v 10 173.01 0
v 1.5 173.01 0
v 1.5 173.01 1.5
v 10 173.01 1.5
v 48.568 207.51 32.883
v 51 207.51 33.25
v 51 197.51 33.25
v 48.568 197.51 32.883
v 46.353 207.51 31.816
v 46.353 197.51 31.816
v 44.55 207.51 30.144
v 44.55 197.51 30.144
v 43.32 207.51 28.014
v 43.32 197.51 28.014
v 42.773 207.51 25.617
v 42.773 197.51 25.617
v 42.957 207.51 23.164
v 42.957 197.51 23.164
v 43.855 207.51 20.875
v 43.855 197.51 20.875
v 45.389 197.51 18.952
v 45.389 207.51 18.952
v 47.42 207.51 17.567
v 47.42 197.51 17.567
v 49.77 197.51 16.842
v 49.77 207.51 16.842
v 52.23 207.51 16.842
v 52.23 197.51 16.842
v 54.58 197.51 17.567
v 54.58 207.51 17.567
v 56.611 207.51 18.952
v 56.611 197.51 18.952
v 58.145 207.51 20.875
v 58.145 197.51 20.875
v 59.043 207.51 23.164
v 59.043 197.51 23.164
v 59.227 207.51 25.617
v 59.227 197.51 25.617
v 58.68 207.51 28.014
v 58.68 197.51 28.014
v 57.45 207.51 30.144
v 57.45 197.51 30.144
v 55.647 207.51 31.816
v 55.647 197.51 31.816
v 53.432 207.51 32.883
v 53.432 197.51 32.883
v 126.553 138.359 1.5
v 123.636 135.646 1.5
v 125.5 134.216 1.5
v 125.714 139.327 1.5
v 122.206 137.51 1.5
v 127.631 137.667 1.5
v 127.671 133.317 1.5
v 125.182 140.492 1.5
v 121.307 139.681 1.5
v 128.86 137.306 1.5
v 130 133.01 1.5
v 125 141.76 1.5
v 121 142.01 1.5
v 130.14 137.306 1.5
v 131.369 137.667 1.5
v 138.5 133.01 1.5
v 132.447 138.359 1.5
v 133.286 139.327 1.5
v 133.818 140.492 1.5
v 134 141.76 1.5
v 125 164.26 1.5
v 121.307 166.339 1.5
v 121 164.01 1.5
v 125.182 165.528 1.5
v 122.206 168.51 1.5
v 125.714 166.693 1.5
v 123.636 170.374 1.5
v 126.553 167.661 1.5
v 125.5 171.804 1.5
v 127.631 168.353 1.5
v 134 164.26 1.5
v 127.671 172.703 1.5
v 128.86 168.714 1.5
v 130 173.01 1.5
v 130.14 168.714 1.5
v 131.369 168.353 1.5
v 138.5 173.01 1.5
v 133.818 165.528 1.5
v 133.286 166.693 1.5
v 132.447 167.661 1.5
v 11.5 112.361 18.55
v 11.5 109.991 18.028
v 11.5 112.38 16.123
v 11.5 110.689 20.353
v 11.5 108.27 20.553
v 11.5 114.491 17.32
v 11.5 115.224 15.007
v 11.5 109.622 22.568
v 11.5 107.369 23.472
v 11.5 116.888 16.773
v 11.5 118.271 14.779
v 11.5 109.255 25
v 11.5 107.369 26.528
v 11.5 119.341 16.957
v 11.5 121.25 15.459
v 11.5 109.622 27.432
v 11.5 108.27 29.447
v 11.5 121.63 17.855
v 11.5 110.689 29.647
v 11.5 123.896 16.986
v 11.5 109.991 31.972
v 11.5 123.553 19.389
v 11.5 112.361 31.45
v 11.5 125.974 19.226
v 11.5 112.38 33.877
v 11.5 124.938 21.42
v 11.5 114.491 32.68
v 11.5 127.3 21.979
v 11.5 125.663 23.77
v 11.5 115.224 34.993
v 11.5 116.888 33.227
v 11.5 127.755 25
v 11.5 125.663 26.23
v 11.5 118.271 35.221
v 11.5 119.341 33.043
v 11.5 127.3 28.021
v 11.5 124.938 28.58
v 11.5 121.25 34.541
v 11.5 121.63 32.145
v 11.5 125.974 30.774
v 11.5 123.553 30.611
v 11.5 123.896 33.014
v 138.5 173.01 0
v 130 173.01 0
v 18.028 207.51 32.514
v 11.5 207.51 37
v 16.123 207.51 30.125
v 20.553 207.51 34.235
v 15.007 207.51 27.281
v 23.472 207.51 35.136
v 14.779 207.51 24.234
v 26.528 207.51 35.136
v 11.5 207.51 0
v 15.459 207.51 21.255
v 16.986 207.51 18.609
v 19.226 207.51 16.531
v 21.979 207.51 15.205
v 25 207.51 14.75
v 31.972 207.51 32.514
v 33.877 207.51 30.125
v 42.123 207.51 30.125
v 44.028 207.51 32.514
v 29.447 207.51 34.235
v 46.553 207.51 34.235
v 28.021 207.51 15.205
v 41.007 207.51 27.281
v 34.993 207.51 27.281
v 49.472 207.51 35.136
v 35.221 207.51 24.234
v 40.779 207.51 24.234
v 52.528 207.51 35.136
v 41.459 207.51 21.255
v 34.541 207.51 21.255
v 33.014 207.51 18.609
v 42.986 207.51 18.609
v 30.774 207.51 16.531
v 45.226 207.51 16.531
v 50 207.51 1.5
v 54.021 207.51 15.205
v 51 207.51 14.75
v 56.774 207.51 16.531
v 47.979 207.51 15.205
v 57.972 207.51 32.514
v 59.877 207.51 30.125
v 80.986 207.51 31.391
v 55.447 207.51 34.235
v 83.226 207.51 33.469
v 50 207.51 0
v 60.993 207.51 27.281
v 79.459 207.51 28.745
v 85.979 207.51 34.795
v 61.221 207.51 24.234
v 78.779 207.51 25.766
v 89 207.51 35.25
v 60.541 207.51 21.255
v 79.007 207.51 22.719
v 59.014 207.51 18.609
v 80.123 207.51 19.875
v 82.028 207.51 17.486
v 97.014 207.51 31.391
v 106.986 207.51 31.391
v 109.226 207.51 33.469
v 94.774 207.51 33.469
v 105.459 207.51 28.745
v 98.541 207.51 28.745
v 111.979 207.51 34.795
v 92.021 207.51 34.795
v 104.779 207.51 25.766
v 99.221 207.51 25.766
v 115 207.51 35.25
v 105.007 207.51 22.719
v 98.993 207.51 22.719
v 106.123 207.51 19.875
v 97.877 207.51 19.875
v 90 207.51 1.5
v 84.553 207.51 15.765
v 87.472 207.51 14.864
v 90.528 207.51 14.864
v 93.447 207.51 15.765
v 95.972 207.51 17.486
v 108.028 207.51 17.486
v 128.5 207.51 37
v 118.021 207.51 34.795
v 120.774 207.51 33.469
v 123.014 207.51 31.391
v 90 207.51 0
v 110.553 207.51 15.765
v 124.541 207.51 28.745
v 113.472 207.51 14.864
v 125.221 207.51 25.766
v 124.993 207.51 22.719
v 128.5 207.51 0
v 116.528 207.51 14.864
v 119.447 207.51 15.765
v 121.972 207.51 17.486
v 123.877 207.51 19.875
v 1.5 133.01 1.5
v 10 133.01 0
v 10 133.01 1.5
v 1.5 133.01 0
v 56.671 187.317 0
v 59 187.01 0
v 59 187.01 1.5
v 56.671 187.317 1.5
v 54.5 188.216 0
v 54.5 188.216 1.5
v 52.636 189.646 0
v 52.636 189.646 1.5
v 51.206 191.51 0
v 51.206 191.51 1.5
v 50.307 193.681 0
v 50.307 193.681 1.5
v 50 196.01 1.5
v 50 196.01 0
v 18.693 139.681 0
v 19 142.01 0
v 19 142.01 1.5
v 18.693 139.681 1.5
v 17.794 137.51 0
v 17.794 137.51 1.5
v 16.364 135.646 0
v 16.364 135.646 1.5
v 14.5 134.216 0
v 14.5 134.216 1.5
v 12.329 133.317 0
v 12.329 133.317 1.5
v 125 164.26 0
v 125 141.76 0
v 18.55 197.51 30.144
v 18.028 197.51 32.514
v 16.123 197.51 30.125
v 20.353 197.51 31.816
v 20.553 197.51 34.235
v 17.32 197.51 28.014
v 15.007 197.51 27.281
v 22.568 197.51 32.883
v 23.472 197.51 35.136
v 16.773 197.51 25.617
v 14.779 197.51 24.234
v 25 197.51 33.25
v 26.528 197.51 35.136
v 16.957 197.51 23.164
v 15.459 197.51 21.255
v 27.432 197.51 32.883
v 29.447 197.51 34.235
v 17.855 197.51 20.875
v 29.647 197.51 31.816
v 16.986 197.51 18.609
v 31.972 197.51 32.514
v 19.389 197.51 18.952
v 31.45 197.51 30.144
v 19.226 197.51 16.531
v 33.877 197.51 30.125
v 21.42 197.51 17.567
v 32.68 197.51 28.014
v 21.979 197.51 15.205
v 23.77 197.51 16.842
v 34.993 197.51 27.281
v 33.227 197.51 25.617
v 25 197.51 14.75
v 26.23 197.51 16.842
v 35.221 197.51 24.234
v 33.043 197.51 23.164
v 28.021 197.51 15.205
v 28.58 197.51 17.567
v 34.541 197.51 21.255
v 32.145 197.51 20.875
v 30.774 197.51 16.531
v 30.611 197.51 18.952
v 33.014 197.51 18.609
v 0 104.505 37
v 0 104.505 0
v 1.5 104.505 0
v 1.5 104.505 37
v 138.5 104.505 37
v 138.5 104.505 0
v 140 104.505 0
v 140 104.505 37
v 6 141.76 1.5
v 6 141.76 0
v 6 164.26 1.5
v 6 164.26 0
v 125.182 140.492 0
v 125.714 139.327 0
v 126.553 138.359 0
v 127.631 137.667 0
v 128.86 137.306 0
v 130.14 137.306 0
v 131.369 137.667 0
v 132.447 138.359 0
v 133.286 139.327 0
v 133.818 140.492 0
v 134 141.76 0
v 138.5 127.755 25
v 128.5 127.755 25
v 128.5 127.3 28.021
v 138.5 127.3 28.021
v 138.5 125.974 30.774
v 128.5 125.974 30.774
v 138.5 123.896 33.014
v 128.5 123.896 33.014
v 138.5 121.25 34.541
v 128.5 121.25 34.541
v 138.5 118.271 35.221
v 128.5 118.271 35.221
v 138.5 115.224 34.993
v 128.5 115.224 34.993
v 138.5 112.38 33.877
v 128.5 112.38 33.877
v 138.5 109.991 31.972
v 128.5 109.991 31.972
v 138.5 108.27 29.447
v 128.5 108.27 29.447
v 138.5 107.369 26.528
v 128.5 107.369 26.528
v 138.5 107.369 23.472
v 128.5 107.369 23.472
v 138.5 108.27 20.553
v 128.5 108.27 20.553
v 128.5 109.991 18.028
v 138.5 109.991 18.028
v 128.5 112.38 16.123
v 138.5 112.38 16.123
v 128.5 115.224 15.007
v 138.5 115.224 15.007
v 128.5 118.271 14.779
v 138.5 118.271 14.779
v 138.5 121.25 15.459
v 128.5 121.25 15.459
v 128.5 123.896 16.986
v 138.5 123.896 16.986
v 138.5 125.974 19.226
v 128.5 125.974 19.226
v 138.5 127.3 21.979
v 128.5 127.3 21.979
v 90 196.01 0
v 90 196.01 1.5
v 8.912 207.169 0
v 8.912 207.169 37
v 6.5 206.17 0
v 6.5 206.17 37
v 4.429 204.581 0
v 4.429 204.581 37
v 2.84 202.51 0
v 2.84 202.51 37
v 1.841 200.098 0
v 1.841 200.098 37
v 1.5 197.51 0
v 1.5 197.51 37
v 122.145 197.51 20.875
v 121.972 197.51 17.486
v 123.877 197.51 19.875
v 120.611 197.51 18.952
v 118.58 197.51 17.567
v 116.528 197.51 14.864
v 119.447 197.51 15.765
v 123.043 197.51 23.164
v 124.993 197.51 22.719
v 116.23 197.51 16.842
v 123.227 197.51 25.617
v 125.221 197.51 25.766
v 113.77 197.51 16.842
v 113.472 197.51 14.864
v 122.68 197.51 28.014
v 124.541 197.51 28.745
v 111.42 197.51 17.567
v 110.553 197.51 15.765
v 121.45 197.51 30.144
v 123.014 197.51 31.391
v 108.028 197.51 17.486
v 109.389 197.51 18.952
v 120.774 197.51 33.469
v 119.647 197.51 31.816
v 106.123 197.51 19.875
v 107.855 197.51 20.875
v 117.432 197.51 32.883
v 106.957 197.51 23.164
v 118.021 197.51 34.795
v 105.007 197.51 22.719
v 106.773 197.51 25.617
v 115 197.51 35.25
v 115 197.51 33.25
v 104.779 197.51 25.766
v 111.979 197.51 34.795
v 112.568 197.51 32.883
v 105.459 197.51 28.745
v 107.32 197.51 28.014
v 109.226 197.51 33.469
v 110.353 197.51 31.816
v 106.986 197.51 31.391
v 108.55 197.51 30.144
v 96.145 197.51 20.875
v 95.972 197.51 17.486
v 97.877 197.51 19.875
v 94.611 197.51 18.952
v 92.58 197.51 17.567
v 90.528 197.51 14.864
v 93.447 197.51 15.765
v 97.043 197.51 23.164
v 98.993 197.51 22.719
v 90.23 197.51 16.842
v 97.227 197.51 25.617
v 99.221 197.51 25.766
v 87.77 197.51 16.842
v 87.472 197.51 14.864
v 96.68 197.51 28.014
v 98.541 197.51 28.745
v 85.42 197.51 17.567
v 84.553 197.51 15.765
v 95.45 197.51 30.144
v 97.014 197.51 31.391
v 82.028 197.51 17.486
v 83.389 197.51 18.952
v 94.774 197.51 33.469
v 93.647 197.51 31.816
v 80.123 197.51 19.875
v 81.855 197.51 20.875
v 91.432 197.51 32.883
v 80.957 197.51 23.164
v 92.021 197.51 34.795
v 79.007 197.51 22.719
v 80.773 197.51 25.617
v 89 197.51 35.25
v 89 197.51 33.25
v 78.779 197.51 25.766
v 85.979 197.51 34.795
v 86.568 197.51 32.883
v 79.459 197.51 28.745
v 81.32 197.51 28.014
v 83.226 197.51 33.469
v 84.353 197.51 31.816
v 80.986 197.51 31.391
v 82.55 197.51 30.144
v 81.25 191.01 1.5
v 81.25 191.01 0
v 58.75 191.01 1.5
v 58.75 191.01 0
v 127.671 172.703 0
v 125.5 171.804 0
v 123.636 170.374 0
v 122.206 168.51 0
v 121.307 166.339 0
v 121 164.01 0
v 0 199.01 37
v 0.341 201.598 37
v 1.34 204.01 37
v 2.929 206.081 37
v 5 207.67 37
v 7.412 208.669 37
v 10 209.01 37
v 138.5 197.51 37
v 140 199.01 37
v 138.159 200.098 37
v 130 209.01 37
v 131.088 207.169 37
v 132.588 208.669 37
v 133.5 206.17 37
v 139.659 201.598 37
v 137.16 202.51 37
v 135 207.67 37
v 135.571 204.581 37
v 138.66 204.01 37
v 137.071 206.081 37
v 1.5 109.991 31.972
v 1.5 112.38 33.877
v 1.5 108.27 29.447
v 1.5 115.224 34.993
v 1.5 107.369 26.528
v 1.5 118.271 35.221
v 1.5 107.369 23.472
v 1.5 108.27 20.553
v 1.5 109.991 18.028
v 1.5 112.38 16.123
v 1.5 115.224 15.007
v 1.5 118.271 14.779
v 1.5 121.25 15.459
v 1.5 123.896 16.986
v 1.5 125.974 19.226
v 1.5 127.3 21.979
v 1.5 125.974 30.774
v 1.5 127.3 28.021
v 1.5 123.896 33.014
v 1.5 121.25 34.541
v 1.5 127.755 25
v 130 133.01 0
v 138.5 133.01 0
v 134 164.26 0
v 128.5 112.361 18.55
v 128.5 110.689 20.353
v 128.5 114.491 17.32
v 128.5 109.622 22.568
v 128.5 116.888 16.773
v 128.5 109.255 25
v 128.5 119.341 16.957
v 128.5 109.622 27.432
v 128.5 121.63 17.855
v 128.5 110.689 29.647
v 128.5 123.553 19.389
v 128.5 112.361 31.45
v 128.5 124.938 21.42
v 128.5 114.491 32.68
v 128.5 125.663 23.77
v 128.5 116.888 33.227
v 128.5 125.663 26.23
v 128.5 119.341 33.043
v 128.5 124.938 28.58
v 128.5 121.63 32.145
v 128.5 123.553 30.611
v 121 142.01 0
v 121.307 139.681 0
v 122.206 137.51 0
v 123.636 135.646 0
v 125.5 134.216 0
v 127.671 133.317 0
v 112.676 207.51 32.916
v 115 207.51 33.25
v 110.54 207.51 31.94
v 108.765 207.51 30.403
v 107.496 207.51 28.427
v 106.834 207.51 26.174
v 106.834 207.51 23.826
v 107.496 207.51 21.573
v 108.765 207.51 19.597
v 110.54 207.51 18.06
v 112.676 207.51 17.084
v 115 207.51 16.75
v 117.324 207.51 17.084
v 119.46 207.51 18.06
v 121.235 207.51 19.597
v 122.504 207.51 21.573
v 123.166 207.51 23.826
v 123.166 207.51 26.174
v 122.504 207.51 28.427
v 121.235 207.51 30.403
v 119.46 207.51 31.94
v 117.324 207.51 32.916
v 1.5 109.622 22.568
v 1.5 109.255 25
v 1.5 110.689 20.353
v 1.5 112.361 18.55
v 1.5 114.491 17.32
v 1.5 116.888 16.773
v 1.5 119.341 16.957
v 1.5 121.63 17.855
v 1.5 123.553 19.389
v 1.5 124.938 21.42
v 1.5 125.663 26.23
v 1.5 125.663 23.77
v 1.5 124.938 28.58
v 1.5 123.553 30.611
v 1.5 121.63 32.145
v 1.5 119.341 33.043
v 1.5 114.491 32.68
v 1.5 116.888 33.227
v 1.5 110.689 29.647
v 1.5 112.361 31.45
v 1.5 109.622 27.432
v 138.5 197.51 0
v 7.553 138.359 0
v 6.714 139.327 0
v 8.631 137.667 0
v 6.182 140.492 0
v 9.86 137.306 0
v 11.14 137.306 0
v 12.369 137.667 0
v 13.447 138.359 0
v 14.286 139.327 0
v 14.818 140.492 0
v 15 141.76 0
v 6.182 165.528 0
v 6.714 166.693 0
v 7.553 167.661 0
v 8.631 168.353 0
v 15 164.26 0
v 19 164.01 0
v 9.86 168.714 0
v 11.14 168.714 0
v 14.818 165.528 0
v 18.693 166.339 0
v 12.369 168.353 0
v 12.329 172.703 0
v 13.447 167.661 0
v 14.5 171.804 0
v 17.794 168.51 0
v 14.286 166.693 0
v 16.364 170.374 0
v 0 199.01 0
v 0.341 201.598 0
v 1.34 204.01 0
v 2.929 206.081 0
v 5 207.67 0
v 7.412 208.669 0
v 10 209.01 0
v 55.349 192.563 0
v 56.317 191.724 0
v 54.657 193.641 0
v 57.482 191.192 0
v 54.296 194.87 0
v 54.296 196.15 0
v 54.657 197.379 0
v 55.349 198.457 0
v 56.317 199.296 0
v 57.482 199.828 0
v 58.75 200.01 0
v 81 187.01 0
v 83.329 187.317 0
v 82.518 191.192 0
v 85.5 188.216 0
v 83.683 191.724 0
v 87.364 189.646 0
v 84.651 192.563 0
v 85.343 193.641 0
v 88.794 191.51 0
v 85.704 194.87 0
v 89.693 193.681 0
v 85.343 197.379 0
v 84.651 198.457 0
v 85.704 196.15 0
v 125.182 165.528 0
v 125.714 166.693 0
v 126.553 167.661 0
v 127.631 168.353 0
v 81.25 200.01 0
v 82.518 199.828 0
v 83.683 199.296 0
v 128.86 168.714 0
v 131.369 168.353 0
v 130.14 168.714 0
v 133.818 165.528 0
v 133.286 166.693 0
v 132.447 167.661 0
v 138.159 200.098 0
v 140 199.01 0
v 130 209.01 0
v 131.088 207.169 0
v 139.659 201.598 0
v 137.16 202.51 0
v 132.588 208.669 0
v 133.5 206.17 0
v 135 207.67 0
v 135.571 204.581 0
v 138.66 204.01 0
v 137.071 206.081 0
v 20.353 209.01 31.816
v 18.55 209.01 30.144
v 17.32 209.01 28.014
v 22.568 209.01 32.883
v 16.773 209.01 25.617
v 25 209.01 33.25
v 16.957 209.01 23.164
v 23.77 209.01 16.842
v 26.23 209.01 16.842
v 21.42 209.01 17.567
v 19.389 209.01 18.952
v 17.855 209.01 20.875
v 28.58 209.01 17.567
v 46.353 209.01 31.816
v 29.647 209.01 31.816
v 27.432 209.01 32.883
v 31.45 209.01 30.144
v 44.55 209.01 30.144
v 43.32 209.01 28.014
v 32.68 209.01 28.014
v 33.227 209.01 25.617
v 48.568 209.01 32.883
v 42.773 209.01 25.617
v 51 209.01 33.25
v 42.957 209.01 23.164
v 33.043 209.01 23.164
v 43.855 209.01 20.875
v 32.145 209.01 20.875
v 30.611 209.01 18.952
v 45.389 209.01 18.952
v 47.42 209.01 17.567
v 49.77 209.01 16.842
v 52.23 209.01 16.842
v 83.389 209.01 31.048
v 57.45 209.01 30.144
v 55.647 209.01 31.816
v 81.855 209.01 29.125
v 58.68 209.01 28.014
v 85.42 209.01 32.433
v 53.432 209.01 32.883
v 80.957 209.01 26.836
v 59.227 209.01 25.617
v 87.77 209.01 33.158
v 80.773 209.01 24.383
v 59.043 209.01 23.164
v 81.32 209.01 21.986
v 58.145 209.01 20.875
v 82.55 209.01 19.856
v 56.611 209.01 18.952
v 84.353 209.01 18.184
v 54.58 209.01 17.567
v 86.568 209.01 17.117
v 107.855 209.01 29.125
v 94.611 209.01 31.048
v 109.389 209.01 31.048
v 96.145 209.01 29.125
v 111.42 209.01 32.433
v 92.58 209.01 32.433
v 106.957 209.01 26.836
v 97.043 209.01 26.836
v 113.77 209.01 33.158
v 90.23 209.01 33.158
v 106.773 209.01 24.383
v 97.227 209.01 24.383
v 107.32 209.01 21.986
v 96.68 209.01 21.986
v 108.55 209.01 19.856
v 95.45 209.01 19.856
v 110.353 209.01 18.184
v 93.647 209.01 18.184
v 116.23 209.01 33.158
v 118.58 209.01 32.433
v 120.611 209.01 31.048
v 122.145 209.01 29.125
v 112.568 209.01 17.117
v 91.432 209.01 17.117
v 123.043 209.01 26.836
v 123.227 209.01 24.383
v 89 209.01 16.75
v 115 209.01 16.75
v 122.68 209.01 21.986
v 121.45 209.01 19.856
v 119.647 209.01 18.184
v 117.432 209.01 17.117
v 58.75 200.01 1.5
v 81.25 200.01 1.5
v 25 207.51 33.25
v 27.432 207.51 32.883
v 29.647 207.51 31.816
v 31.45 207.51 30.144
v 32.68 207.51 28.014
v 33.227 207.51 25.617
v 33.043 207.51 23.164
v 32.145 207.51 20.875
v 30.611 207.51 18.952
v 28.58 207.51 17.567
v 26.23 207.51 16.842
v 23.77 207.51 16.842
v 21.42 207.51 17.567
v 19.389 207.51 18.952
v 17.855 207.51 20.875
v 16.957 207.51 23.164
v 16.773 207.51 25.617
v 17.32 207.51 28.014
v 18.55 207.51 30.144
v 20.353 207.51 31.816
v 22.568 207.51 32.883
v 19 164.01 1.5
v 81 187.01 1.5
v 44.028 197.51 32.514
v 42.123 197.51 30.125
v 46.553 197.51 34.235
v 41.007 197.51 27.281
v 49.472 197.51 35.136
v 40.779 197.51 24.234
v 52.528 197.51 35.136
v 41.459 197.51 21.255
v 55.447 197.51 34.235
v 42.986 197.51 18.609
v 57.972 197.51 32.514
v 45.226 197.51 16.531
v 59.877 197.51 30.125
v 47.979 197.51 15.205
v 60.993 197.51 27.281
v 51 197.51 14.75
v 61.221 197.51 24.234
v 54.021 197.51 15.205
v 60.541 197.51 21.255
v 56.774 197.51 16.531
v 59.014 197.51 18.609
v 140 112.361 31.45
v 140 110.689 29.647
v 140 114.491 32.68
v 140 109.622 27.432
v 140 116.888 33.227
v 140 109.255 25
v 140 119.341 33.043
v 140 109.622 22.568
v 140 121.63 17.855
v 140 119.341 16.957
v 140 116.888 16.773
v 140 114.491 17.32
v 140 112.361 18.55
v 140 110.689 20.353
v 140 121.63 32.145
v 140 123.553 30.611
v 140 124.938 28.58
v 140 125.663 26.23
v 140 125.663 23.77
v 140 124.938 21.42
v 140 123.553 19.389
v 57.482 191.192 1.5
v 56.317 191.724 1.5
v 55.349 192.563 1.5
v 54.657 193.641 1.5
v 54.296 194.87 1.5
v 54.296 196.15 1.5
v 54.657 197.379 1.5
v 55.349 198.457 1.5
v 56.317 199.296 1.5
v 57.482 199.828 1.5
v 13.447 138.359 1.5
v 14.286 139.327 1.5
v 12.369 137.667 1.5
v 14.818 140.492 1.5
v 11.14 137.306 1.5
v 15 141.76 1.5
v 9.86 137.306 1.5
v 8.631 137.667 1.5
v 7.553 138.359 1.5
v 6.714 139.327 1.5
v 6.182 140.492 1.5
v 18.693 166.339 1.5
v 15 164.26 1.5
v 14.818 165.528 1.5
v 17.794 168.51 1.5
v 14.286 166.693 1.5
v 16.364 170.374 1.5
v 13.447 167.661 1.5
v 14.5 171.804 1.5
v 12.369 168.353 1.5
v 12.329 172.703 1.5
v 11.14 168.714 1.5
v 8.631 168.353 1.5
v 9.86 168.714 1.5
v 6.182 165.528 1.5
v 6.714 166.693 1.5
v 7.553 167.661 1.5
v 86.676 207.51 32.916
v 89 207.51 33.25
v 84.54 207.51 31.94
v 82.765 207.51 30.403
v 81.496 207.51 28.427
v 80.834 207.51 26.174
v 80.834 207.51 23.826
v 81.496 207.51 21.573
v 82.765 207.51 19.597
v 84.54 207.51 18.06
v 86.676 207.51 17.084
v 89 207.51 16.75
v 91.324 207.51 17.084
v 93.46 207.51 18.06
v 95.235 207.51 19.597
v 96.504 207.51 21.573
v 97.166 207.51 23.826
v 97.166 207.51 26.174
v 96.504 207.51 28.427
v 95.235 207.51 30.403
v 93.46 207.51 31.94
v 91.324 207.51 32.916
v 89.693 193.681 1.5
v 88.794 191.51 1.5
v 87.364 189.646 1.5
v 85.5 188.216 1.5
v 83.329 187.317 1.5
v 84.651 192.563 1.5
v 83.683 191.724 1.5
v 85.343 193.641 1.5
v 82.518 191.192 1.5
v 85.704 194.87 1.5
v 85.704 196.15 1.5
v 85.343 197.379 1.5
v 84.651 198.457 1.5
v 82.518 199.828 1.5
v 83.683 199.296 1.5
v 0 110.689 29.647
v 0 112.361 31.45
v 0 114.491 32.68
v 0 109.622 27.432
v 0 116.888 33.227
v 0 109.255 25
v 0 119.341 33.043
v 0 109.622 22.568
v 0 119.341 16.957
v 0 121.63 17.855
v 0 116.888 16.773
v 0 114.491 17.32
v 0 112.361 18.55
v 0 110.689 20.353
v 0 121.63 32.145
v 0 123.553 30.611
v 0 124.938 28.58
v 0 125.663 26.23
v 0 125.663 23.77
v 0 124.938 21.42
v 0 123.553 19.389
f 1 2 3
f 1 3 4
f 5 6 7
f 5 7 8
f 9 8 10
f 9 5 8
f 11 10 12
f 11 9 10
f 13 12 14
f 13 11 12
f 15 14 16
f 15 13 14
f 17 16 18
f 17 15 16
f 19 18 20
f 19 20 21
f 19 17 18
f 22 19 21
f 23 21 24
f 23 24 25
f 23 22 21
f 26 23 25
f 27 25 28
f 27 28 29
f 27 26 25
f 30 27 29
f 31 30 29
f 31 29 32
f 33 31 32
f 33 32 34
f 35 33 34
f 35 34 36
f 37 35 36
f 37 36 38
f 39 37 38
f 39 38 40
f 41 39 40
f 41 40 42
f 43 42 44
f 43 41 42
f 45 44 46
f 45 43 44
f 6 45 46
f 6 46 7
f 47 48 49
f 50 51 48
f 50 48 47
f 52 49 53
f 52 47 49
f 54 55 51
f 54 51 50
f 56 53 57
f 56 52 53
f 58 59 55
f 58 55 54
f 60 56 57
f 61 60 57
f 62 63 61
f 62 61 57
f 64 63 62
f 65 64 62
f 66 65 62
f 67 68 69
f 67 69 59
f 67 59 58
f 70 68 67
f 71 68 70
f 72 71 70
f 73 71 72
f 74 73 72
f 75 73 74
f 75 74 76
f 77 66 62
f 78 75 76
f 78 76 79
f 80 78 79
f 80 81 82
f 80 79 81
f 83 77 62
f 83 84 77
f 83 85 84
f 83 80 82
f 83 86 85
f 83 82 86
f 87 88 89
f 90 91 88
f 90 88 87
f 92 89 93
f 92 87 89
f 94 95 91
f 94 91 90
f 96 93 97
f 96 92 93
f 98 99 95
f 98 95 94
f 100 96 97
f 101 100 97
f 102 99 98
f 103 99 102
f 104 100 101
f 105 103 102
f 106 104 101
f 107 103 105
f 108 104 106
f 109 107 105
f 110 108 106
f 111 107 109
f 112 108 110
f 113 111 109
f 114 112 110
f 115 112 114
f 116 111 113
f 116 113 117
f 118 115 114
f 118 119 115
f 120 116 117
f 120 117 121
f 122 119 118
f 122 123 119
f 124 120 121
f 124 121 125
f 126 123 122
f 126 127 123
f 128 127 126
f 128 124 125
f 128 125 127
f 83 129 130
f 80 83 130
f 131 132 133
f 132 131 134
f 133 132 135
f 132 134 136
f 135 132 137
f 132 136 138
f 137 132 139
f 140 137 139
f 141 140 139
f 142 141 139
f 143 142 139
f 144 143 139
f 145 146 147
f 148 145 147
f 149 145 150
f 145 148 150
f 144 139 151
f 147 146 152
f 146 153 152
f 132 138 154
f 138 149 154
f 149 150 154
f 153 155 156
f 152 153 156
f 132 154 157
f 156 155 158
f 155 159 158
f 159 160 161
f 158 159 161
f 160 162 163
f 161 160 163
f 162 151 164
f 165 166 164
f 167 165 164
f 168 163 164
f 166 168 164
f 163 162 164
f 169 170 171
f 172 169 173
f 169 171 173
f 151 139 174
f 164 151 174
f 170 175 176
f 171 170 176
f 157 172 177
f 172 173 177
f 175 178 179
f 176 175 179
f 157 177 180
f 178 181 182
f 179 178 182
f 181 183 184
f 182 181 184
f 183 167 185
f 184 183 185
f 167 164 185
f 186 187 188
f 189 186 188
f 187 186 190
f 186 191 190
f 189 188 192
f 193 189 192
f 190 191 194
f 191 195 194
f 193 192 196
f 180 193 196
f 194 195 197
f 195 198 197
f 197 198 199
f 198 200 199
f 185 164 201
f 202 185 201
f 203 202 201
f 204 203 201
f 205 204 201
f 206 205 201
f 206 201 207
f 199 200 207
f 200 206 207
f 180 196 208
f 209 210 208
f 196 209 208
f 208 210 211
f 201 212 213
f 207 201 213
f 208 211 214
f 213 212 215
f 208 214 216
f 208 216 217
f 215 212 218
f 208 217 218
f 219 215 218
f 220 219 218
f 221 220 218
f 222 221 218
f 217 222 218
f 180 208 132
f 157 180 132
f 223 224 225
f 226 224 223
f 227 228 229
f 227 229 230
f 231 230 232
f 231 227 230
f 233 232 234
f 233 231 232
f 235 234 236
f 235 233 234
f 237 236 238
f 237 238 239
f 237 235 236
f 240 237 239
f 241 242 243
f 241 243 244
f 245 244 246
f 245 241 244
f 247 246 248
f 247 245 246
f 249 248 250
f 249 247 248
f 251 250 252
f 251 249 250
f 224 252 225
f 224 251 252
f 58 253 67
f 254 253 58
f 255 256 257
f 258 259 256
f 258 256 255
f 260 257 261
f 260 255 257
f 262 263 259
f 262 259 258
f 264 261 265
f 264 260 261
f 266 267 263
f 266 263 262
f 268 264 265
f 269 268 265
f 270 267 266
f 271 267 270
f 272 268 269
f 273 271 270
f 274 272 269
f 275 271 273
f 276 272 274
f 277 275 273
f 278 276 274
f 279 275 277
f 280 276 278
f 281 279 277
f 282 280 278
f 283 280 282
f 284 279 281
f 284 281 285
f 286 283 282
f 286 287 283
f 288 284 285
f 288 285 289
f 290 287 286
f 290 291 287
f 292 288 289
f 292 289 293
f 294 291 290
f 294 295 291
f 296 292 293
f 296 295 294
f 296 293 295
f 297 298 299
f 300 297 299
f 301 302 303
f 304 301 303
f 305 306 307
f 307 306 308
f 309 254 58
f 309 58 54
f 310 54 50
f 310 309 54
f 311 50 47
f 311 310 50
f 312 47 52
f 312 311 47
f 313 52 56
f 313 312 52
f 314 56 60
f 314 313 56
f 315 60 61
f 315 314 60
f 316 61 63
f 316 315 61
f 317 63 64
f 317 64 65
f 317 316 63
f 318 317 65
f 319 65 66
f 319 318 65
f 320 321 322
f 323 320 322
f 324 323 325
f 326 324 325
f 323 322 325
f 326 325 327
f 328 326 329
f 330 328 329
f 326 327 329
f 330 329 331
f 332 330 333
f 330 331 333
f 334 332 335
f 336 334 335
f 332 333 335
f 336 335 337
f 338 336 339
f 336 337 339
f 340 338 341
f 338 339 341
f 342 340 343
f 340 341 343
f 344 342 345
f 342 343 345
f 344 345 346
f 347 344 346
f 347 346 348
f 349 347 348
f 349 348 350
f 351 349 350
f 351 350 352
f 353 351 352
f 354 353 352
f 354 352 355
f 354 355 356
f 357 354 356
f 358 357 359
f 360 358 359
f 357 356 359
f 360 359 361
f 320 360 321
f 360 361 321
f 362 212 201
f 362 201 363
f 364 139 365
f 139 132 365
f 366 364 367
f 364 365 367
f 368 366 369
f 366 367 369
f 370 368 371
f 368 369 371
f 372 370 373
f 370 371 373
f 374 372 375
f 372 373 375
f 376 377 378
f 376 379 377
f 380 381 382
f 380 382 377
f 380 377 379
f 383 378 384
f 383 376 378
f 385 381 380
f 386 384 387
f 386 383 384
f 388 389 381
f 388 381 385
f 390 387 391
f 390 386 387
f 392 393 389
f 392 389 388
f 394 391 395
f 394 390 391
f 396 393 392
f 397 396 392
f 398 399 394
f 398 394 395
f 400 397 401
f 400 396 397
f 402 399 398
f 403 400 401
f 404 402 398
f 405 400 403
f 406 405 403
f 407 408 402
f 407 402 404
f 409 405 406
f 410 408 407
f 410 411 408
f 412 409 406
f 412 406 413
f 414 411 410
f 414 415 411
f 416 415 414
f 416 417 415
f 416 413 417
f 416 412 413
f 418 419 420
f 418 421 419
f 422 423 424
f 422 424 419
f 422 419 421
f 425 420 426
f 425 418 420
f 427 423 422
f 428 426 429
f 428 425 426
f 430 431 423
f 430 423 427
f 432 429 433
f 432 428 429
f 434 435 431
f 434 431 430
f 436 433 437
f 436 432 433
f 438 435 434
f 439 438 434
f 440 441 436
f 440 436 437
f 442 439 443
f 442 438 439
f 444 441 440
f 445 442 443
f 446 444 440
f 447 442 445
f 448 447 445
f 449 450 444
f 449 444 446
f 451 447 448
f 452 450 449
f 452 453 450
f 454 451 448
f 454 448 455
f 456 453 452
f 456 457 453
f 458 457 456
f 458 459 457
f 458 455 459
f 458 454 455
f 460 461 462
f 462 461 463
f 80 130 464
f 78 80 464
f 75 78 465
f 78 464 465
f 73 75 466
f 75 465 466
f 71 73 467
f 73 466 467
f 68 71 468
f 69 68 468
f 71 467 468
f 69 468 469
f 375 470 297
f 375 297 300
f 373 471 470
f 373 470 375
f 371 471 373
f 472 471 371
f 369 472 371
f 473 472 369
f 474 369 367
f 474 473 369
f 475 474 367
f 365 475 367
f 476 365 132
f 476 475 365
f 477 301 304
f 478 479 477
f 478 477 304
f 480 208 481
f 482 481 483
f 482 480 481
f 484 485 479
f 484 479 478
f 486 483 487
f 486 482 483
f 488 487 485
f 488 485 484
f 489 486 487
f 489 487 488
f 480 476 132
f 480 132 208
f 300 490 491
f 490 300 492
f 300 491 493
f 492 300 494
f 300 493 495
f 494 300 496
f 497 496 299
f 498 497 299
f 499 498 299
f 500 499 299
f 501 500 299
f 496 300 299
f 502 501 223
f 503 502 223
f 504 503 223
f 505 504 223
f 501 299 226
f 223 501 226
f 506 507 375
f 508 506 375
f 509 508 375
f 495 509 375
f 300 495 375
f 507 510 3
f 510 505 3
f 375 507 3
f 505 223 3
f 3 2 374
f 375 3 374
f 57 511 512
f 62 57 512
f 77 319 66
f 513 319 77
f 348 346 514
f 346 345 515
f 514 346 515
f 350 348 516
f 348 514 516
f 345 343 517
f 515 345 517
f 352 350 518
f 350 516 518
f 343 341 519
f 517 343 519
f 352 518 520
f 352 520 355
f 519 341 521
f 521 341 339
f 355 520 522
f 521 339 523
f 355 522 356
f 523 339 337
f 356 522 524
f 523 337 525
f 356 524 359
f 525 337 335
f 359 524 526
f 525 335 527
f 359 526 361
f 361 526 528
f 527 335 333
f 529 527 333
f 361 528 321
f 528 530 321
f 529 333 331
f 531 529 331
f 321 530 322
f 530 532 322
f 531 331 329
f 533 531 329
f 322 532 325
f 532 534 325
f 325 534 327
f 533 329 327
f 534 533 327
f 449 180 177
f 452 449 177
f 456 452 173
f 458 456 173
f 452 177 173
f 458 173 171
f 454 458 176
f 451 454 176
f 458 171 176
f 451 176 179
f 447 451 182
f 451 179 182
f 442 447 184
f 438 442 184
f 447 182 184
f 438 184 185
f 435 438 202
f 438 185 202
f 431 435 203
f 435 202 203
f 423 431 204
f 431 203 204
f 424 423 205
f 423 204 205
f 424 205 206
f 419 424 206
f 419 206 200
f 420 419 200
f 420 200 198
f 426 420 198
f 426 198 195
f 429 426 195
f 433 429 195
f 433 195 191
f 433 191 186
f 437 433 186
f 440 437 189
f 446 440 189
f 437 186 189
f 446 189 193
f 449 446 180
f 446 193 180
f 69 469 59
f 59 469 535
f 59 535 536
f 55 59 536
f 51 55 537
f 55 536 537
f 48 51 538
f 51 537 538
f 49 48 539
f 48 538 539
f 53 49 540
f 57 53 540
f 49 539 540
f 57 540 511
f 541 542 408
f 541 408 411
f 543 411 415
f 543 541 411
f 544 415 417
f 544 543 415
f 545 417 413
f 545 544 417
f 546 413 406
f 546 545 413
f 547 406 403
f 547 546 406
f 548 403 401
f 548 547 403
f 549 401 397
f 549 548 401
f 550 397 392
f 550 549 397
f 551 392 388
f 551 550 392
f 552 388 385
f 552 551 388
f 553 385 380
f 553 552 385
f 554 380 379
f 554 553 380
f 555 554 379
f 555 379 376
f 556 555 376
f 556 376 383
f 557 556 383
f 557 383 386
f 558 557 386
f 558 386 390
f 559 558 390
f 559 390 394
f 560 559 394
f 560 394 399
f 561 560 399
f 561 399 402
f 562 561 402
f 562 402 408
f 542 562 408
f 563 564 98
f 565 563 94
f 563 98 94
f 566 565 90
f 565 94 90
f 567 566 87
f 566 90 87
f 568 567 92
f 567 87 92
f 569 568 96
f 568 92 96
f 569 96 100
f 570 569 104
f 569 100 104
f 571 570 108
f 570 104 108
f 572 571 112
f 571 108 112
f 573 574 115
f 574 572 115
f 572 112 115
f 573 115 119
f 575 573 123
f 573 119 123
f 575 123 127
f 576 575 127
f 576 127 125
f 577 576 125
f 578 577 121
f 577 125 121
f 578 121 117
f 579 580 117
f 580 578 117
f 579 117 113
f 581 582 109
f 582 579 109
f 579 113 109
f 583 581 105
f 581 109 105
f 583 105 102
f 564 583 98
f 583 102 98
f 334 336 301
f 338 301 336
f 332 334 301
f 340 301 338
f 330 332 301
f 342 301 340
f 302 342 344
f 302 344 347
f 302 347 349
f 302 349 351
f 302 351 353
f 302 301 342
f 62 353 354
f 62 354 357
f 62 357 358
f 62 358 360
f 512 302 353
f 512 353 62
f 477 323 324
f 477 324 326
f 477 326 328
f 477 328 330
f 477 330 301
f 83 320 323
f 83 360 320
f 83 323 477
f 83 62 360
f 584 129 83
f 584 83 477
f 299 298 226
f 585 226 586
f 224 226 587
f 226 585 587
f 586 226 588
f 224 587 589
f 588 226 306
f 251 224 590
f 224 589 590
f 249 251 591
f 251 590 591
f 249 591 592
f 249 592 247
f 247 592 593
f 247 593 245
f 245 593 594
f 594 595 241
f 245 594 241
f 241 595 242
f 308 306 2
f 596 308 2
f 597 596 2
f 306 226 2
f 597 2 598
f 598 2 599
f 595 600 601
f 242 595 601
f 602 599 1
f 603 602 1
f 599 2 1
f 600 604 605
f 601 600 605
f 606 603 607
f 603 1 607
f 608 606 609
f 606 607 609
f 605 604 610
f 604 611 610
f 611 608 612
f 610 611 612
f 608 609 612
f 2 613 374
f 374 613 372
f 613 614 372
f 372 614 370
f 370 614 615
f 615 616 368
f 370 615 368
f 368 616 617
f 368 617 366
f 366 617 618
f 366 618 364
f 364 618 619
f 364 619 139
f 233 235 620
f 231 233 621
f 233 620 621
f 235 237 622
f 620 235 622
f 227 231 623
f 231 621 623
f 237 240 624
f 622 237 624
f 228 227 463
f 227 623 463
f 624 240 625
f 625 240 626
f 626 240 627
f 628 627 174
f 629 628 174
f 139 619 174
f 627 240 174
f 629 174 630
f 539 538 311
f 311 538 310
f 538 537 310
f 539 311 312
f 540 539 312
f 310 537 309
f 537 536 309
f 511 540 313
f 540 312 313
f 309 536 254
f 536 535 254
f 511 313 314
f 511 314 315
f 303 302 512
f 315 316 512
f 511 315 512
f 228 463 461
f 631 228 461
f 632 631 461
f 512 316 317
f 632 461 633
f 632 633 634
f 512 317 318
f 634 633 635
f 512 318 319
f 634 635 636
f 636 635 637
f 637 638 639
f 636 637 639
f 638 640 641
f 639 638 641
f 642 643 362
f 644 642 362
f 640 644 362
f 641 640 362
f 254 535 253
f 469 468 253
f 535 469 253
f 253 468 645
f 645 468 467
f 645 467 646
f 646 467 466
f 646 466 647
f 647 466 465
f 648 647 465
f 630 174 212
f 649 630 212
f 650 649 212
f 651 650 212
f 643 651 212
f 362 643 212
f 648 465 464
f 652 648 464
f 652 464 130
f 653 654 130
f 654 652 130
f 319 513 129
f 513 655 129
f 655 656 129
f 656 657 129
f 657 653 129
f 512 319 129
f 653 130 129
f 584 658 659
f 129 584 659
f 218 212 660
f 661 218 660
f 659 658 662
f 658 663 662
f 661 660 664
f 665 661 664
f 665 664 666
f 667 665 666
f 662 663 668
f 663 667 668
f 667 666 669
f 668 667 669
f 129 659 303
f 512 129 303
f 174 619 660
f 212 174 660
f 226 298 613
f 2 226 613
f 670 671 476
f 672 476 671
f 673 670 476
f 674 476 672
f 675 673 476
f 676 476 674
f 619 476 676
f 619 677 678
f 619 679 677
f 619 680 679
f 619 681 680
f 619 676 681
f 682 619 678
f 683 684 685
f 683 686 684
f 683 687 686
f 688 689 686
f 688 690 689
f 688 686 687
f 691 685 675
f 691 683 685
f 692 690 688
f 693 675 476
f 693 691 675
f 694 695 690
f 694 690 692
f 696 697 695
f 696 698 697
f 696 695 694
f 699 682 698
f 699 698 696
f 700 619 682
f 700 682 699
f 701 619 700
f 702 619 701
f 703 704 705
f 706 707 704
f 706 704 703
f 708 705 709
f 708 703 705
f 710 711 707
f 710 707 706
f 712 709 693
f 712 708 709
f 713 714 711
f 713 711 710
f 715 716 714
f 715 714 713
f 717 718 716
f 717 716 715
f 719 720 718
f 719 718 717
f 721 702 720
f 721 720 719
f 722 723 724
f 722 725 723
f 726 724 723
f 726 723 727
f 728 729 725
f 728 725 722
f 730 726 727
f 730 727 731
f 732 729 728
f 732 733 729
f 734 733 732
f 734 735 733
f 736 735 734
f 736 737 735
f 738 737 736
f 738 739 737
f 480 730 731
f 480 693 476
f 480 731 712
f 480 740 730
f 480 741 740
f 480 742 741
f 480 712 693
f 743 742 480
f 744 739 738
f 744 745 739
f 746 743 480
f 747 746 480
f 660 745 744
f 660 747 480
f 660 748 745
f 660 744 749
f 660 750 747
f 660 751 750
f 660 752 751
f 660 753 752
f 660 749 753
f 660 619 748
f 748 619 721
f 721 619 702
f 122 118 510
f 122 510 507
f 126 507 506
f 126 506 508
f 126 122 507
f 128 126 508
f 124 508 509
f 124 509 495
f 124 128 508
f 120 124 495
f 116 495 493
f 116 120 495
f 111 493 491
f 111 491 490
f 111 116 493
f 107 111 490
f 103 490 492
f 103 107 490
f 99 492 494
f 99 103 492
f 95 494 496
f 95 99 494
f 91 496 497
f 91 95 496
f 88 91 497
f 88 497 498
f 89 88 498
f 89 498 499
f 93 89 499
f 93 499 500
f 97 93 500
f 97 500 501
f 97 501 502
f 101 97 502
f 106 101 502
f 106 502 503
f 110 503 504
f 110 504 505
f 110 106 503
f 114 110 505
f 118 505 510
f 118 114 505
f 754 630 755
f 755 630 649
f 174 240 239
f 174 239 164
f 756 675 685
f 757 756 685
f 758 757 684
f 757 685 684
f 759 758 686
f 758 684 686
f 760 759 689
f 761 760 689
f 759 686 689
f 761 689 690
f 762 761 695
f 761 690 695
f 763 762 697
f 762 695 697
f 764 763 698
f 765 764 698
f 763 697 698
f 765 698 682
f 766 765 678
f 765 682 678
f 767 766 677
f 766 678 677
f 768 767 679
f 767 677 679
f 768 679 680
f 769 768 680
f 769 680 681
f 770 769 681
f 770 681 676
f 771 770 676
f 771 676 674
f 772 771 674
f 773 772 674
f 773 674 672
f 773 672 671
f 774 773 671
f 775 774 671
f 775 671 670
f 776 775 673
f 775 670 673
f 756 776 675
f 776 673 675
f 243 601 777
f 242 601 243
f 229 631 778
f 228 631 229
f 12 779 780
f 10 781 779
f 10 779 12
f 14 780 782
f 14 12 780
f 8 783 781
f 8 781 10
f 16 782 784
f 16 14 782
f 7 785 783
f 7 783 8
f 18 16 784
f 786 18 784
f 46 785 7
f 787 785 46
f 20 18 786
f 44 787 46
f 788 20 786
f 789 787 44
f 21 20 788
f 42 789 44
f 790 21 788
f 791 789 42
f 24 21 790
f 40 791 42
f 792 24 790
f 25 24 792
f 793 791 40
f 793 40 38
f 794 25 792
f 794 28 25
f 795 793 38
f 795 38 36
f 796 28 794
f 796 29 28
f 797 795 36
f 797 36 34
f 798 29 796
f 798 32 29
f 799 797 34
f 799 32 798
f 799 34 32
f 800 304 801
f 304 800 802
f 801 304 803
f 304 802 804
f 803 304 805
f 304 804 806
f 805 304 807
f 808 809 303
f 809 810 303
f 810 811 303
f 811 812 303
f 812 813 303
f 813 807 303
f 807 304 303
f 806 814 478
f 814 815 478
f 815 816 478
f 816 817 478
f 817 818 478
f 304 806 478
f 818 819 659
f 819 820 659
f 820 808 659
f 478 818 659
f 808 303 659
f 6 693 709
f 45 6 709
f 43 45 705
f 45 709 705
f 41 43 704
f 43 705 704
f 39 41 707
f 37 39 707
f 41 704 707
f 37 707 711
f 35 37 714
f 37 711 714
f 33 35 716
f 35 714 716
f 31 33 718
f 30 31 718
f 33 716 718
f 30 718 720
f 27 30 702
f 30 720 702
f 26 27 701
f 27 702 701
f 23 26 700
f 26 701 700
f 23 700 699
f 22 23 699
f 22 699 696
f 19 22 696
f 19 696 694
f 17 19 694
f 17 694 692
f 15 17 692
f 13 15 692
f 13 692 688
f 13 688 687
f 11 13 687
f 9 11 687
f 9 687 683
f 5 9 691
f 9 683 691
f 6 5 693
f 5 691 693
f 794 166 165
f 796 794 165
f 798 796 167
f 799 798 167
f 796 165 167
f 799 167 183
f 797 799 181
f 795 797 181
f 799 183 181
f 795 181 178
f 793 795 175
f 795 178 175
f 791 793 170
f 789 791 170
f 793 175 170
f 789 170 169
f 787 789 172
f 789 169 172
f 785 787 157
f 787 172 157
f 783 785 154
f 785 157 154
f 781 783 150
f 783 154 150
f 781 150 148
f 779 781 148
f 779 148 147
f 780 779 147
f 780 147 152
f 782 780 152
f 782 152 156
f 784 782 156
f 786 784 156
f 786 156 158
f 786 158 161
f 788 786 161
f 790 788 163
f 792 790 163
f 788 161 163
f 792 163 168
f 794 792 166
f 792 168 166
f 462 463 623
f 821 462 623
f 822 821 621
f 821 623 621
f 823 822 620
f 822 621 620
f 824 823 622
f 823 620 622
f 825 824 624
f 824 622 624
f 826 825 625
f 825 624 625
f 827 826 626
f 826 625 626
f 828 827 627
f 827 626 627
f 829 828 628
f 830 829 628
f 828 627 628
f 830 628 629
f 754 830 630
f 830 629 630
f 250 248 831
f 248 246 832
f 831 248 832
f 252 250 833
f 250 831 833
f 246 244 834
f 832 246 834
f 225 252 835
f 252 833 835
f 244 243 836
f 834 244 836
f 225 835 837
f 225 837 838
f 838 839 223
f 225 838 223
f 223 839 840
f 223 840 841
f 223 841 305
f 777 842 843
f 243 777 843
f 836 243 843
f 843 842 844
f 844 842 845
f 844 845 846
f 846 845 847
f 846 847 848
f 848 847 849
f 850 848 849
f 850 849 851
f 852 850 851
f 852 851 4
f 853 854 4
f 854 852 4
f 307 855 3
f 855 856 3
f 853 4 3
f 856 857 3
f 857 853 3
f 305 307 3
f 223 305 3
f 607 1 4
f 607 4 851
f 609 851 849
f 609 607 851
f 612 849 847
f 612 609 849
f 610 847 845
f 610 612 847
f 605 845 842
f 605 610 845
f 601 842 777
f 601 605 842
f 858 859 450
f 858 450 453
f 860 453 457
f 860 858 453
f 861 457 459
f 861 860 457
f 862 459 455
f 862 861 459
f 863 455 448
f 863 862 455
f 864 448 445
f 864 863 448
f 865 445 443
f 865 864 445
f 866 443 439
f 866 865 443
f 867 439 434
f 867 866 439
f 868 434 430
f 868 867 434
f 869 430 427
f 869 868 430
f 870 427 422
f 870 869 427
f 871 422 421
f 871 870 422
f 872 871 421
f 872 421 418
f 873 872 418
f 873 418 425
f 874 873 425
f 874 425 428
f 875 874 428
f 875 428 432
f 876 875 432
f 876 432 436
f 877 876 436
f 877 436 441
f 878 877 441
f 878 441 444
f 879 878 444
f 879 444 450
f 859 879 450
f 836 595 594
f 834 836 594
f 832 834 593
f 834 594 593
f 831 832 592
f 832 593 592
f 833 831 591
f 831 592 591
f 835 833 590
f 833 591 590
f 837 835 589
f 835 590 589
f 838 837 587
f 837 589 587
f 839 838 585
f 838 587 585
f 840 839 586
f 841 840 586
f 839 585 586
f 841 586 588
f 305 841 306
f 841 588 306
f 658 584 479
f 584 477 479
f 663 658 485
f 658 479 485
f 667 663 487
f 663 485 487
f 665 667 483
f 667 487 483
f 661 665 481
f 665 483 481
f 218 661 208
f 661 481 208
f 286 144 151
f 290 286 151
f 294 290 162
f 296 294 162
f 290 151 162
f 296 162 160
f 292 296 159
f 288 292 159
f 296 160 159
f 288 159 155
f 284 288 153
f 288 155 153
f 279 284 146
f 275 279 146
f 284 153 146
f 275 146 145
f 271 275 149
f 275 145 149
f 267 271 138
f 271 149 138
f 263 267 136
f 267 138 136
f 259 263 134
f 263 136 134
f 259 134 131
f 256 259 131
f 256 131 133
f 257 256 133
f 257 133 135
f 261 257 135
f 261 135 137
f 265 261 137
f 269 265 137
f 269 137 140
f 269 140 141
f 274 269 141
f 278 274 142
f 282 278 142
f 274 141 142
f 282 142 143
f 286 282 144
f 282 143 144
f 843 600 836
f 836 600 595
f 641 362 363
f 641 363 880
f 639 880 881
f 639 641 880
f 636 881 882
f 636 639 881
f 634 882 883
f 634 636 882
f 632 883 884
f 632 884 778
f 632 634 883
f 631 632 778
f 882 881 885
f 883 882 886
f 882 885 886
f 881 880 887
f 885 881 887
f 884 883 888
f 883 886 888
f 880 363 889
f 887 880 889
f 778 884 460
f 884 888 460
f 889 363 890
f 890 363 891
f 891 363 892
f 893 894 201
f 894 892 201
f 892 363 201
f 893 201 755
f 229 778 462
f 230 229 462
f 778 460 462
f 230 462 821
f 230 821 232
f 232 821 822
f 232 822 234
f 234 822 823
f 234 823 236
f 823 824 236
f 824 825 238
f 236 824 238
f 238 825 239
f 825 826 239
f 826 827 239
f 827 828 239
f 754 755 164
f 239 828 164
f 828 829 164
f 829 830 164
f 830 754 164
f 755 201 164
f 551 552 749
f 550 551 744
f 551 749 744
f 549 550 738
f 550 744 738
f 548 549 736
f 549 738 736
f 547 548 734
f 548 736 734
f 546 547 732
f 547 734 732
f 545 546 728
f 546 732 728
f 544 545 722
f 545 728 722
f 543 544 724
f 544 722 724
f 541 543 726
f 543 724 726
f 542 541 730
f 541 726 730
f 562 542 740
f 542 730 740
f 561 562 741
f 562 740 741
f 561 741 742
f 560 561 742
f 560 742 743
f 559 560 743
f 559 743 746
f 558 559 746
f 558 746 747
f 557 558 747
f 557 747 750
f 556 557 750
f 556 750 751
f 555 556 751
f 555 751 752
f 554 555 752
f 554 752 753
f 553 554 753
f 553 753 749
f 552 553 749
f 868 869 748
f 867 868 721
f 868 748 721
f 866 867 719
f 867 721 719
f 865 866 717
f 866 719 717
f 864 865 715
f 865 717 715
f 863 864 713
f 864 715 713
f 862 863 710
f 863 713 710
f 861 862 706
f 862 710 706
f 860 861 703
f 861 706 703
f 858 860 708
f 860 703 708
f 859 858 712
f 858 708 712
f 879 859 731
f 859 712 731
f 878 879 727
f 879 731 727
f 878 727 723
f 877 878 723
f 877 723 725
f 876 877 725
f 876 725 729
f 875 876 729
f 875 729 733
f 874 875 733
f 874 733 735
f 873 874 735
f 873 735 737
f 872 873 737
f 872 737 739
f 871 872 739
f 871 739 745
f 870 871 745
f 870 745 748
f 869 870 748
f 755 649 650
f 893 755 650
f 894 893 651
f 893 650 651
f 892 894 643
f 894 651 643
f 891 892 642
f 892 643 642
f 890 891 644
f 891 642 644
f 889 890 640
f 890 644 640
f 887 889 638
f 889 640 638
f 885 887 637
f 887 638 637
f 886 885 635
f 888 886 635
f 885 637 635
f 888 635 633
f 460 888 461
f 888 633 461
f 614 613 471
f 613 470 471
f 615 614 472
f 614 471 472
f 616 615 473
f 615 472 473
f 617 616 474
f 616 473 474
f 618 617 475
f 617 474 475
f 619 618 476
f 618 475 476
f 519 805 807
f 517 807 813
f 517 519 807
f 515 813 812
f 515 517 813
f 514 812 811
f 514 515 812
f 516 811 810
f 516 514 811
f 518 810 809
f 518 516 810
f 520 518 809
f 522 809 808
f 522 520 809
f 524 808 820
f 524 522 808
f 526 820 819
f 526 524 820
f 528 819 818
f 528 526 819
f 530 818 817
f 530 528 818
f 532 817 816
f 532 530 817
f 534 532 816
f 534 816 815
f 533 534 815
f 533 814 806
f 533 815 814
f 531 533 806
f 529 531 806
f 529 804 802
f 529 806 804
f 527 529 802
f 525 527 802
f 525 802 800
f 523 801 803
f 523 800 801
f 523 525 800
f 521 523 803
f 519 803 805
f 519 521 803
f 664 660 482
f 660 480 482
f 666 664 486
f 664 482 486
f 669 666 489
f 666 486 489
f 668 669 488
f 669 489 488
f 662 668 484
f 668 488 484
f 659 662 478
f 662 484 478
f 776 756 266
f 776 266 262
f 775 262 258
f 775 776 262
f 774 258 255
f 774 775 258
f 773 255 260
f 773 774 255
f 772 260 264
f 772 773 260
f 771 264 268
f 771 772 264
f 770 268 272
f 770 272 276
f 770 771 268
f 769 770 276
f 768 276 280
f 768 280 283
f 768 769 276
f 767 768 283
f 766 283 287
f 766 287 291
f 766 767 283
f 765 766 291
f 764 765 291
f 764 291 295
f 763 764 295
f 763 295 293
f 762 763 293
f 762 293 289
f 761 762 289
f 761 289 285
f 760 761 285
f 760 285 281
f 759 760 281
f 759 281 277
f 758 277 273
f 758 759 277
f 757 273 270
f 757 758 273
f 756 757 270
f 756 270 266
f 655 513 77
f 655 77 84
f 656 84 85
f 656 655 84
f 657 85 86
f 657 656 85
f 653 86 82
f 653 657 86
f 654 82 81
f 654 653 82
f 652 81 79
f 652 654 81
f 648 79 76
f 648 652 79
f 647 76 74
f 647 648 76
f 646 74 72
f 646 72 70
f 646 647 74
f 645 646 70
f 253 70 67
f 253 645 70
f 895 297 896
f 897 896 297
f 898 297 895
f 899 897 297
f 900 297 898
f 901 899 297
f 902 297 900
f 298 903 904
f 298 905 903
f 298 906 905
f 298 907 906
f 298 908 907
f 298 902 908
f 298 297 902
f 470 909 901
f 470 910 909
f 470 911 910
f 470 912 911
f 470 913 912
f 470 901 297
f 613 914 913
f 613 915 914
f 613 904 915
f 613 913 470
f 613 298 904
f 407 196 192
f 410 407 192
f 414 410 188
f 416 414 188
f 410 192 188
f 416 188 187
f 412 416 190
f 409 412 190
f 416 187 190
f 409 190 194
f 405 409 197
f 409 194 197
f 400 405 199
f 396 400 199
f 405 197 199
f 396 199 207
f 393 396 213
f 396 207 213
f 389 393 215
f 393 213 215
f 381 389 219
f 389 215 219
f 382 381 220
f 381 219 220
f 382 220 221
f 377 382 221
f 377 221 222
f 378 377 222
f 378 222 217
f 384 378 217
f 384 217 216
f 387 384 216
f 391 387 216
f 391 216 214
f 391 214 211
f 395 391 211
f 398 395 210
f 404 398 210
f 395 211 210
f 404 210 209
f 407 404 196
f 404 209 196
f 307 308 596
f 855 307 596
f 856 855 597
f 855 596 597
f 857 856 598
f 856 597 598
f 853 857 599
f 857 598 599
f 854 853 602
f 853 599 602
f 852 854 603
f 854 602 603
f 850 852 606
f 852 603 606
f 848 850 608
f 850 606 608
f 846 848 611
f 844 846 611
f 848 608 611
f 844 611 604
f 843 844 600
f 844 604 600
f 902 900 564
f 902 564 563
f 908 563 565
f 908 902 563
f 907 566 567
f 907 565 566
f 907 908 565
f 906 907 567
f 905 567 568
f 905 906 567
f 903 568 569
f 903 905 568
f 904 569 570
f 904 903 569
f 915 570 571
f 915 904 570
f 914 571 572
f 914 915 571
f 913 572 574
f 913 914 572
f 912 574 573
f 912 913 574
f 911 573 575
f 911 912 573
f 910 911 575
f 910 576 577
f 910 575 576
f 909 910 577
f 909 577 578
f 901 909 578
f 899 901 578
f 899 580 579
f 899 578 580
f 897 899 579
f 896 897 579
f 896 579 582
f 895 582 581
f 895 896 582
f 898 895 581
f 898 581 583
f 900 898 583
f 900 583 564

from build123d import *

# Parameters (mm, degrees)
SKIZZE1_W                            = 140
SKIZZE1_H                            = 209.01
SKIZZE1_W_2                          = 137
SKIZZE1_H_2                          = 206.01
AUFSATZ_LINEAR_AUSTRAGEN1_DEPTH      = 37
VERRUNDUNG1_R                        = 10
SKIZZE3_R                            = 8.25
SCHNITT_LINEAR_AUSTRAGEN1_DEPTH      = 1.5
SCHNITT_LINEAR_AUSTRAGEN2_DEPTH      = 255.27186258
SCHNITT_LINEAR_AUSTRAGEN2_DEPTH_BACK = 255.27186258
SKIZZE4_R                            = 8.25
AUFSATZ_LINEAR_AUSTRAGEN3_DEPTH      = 1.5
SCHNITT_LINEAR_AUSTRAGEN3_DEPTH      = 255.057926662
SCHNITT_LINEAR_AUSTRAGEN3_DEPTH_BACK = 255.057926662
SKIZZE6_W                            = 230.516002865
SKIZZE6_H                            = 119.565202556
SKIZZE7_R                            = 10.25
SKIZZE7_R_2                          = 8.25
AUFSATZ_LINEAR_AUSTRAGEN4_DEPTH      = 10
AUFSATZ_LINEAR_START                 = 10
SKIZZE8_R                            = 10.25
SKIZZE8_R_2                          = 8.25
AUFSATZ_LINEAR_AUSTRAGEN5_DEPTH      = 10


with BuildPart() as part:
    # Skizze1 → Aufsatz-Linear austragen1 (new body)
    with BuildSketch(Plane.XY):
        with Locations((70, 104.505)):
            Rectangle(SKIZZE1_W, SKIZZE1_H)
        with Locations((70, 104.505)):
            Rectangle(SKIZZE1_W_2, SKIZZE1_H_2, mode=Mode.SUBTRACT)
    extrude(amount=AUFSATZ_LINEAR_AUSTRAGEN1_DEPTH)

    # Verrundung1
    verrundung1_edges = [part.edges().sort_by_distance(p)[0] for p in [
        (1.5, 207.51, 18.5),
        (1.5, 1.5, 18.5),
        (138.5, 1.5, 18.5),
        (138.5, 207.51, 18.5),
        (0, 209.01, 18.5),
        (140, 209.01, 18.5),
        (140, 0, 18.5),
        (0, 0, 18.5),
    ]]
    fillet(verrundung1_edges, radius=VERRUNDUNG1_R)

    # Skizze3 → Schnitt-Linear austragen1 (cut)
    with BuildSketch(Plane(origin=(0, 209.01, 0), x_dir=(1, 0, 0), z_dir=(0, 1, 0))):
        with Locations(Location((25, -25, 0), (0, 0, 270))):
            Circle(SKIZZE3_R)
        with Locations(Location((51, -25, 0), (0, 0, 270))):
            Circle(SKIZZE3_R)
        with Locations(Location((89, -25, 0), (0, 0, 90))):
            Circle(SKIZZE3_R)
        with Locations(Location((115, -25, 0), (0, 0, 90))):
            Circle(SKIZZE3_R)
    extrude(amount=-SCHNITT_LINEAR_AUSTRAGEN1_DEPTH, mode=Mode.SUBTRACT)

    # Skizze4 → Schnitt-Linear austragen2 (cut, two sides: drawn at the far end of the back side and taken through both)
    with BuildSketch(Plane(origin=(140, 0, 0), x_dir=(0, 0, -1), z_dir=(1, 0, 0)).offset(-SCHNITT_LINEAR_AUSTRAGEN2_DEPTH_BACK)):
        with Locations(Location((-25, 117.505, 0), (0, 0, 270))):
            Circle(SKIZZE4_R)
        with Locations(Location((-25, 91.505, 0), (0, 0, 270))):
            Circle(SKIZZE4_R)
    extrude(amount=SCHNITT_LINEAR_AUSTRAGEN2_DEPTH + SCHNITT_LINEAR_AUSTRAGEN2_DEPTH_BACK, mode=Mode.SUBTRACT)

    # Skizze5 → Aufsatz-Linear austragen3 (add)
    # profile 1 of 5: a face of its own
    with BuildSketch(Plane(origin=(0, 0, 0), x_dir=(-1, 0, 0), z_dir=(0, 0, -1))):
        with BuildLine():
            Line((-140, 173.01), (-130, 173.01))
            ThreePointArc((-130, 173.01), (-123.636038969, 170.373961031), (-121, 164.01))
            Line((-121, 164.01), (-121, 142.01))
            ThreePointArc((-121, 142.01), (-123.636038969, 135.646038969), (-130, 133.01))
            Line((-130, 133.01), (-140, 133.01))
            Line((-140, 133.01), (-140, 173.01))
        make_face()
        with BuildLine():
            Line((-125, 164.26), (-125, 141.76))
            ThreePointArc((-125, 141.76), (-129.5, 137.26), (-134, 141.76))
            Line((-134, 141.76), (-134, 164.26))
            ThreePointArc((-134, 164.26), (-129.5, 168.76), (-125, 164.26))
        make_face(mode=Mode.SUBTRACT)
    # profile 2 of 5: a face of its own
    with BuildSketch(Plane(origin=(0, 0, 0), x_dir=(-1, 0, 0), z_dir=(0, 0, -1))):
        with BuildLine():
            Line((-90, 209.01), (-90, 196.01))
            ThreePointArc((-90, 196.01), (-87.363961031, 189.646038969), (-81, 187.01))
            Line((-81, 187.01), (-59, 187.01))
            ThreePointArc((-59, 187.01), (-52.636038969, 189.646038969), (-50, 196.01))
            Line((-50, 196.01), (-50, 209.01))
            Line((-50, 209.01), (-90, 209.01))
        make_face()
        with BuildLine():
            Line((-58.75, 200.01), (-81.25, 200.01))
            ThreePointArc((-81.25, 200.01), (-85.75, 195.51), (-81.25, 191.01))
            Line((-81.25, 191.01), (-58.75, 191.01))
            ThreePointArc((-58.75, 191.01), (-54.25, 195.51), (-58.75, 200.01))
        make_face(mode=Mode.SUBTRACT)
    # profile 3 of 5: a face of its own
    with BuildSketch(Plane(origin=(0, 0, 0), x_dir=(-1, 0, 0), z_dir=(0, 0, -1))):
        with BuildLine():
            Line((-19, 164.01), (-19, 142.01))
            ThreePointArc((-19, 142.01), (-16.363961031, 135.646038969), (-10, 133.01))
            Line((-10, 133.01), (0, 133.01))
            Line((0, 133.01), (0, 173.01))
            Line((0, 173.01), (-10, 173.01))
            ThreePointArc((-10, 173.01), (-16.363961031, 170.373961031), (-19, 164.01))
        make_face()
        with BuildLine():
            Line((-15, 164.26), (-15, 141.76))
            ThreePointArc((-15, 141.76), (-10.5, 137.26), (-6, 141.76))
            Line((-6, 141.76), (-6, 164.26))
            ThreePointArc((-6, 164.26), (-10.5, 168.76), (-15, 164.26))
        make_face(mode=Mode.SUBTRACT)
    # profile 4 of 5: a face of its own
    with BuildSketch(Plane(origin=(0, 0, 0), x_dir=(-1, 0, 0), z_dir=(0, 0, -1))):
        with BuildLine():
            Line((0, 36), (-10, 36))
            ThreePointArc((-10, 36), (-16.363961031, 38.636038969), (-19, 45))
            Line((-19, 45), (-19, 67))
            ThreePointArc((-19, 67), (-16.363961031, 73.363961031), (-10, 76))
            Line((-10, 76), (0, 76))
            Line((0, 76), (0, 36))
        make_face()
        with BuildLine():
            Line((-15, 44.75), (-15, 67.25))
            ThreePointArc((-15, 67.25), (-10.5, 71.75), (-6, 67.25))
            Line((-6, 67.25), (-6, 44.75))
            ThreePointArc((-6, 44.75), (-10.5, 40.25), (-15, 44.75))
        make_face(mode=Mode.SUBTRACT)
    # profile 5 of 5: a face of its own
    with BuildSketch(Plane(origin=(0, 0, 0), x_dir=(-1, 0, 0), z_dir=(0, 0, -1))):
        with BuildLine():
            Line((-121, 45), (-121, 67))
            ThreePointArc((-121, 67), (-123.636038969, 73.363961031), (-130, 76))
            Line((-130, 76), (-140, 76))
            Line((-140, 76), (-140, 36))
            Line((-140, 36), (-130, 36))
            ThreePointArc((-130, 36), (-123.636038969, 38.636038969), (-121, 45))
        make_face()
        with BuildLine():
            Line((-125, 44.75), (-125, 67.25))
            ThreePointArc((-125, 67.25), (-129.5, 71.75), (-134, 67.25))
            Line((-134, 67.25), (-134, 44.75))
            ThreePointArc((-134, 44.75), (-129.5, 40.25), (-125, 44.75))
        make_face(mode=Mode.SUBTRACT)
    extrude(amount=-AUFSATZ_LINEAR_AUSTRAGEN3_DEPTH)

    # Skizze6 → Schnitt-Linear austragen3 (cut, two sides: drawn at the far end of the back side and taken through both)
    with BuildSketch(Plane.XY.offset(1.5).offset(-SCHNITT_LINEAR_AUSTRAGEN3_DEPTH_BACK)):
        with Locations((84.29357918, 44.722398722)):
            Rectangle(SKIZZE6_W, SKIZZE6_H)
    extrude(amount=SCHNITT_LINEAR_AUSTRAGEN3_DEPTH + SCHNITT_LINEAR_AUSTRAGEN3_DEPTH_BACK, mode=Mode.SUBTRACT)

    # Skizze7 → Aufsatz-Linear austragen4 (add)
    # profile 1 of 4: a face of its own
    with BuildSketch(Plane.XZ.offset(-207.51)):
        with Locations(Location((51, 25, 0), (0, 0, 270))):
            Circle(SKIZZE7_R)
        with Locations(Location((51, 25, 0), (0, 0, 90))):
            Circle(SKIZZE7_R_2, mode=Mode.SUBTRACT)
    # profile 2 of 4: a face of its own
    with BuildSketch(Plane.XZ.offset(-207.51)):
        with Locations(Location((25, 25, 0), (0, 0, 270))):
            Circle(SKIZZE7_R)
        with Locations(Location((25, 25, 0), (0, 0, 90))):
            Circle(SKIZZE7_R_2, mode=Mode.SUBTRACT)
    # profile 3 of 4: a face of its own
    with BuildSketch(Plane.XZ.offset(-207.51)):
        with Locations(Location((115, 25, 0), (0, 0, 90))):
            Circle(SKIZZE7_R)
        with Locations(Location((115, 25, 0), (0, 0, 90))):
            Circle(SKIZZE7_R_2, mode=Mode.SUBTRACT)
    # profile 4 of 4: a face of its own
    with BuildSketch(Plane.XZ.offset(-207.51)):
        with Locations(Location((89, 25, 0), (0, 0, 90))):
            Circle(SKIZZE7_R)
        with Locations(Location((89, 25, 0), (0, 0, 90))):
            Circle(SKIZZE7_R_2, mode=Mode.SUBTRACT)
    extrude(amount=AUFSATZ_LINEAR_AUSTRAGEN4_DEPTH)

    # Skizze8 → Aufsatz-Linear austragen5 (add)
    with BuildSketch(Plane(origin=(1.5, 0, 0), x_dir=(0, 0, -1), z_dir=(1, 0, 0)).offset(AUFSATZ_LINEAR_START)):
        with Locations(Location((-25, 117.505, 0), (0, 0, 90))):
            Circle(SKIZZE8_R)
        with Locations(Location((-25, 117.505, 0), (0, 0, 270))):
            Circle(SKIZZE8_R_2, mode=Mode.SUBTRACT)
    aufsatz_linear_austragen5 = extrude(amount=-AUFSATZ_LINEAR_AUSTRAGEN5_DEPTH)

    # Spiegeln1: Aufsatz-Linear austragen5 across plane
    add(aufsatz_linear_austragen5.mirror(Plane.ZY.offset(-70)))


solid = part.part
